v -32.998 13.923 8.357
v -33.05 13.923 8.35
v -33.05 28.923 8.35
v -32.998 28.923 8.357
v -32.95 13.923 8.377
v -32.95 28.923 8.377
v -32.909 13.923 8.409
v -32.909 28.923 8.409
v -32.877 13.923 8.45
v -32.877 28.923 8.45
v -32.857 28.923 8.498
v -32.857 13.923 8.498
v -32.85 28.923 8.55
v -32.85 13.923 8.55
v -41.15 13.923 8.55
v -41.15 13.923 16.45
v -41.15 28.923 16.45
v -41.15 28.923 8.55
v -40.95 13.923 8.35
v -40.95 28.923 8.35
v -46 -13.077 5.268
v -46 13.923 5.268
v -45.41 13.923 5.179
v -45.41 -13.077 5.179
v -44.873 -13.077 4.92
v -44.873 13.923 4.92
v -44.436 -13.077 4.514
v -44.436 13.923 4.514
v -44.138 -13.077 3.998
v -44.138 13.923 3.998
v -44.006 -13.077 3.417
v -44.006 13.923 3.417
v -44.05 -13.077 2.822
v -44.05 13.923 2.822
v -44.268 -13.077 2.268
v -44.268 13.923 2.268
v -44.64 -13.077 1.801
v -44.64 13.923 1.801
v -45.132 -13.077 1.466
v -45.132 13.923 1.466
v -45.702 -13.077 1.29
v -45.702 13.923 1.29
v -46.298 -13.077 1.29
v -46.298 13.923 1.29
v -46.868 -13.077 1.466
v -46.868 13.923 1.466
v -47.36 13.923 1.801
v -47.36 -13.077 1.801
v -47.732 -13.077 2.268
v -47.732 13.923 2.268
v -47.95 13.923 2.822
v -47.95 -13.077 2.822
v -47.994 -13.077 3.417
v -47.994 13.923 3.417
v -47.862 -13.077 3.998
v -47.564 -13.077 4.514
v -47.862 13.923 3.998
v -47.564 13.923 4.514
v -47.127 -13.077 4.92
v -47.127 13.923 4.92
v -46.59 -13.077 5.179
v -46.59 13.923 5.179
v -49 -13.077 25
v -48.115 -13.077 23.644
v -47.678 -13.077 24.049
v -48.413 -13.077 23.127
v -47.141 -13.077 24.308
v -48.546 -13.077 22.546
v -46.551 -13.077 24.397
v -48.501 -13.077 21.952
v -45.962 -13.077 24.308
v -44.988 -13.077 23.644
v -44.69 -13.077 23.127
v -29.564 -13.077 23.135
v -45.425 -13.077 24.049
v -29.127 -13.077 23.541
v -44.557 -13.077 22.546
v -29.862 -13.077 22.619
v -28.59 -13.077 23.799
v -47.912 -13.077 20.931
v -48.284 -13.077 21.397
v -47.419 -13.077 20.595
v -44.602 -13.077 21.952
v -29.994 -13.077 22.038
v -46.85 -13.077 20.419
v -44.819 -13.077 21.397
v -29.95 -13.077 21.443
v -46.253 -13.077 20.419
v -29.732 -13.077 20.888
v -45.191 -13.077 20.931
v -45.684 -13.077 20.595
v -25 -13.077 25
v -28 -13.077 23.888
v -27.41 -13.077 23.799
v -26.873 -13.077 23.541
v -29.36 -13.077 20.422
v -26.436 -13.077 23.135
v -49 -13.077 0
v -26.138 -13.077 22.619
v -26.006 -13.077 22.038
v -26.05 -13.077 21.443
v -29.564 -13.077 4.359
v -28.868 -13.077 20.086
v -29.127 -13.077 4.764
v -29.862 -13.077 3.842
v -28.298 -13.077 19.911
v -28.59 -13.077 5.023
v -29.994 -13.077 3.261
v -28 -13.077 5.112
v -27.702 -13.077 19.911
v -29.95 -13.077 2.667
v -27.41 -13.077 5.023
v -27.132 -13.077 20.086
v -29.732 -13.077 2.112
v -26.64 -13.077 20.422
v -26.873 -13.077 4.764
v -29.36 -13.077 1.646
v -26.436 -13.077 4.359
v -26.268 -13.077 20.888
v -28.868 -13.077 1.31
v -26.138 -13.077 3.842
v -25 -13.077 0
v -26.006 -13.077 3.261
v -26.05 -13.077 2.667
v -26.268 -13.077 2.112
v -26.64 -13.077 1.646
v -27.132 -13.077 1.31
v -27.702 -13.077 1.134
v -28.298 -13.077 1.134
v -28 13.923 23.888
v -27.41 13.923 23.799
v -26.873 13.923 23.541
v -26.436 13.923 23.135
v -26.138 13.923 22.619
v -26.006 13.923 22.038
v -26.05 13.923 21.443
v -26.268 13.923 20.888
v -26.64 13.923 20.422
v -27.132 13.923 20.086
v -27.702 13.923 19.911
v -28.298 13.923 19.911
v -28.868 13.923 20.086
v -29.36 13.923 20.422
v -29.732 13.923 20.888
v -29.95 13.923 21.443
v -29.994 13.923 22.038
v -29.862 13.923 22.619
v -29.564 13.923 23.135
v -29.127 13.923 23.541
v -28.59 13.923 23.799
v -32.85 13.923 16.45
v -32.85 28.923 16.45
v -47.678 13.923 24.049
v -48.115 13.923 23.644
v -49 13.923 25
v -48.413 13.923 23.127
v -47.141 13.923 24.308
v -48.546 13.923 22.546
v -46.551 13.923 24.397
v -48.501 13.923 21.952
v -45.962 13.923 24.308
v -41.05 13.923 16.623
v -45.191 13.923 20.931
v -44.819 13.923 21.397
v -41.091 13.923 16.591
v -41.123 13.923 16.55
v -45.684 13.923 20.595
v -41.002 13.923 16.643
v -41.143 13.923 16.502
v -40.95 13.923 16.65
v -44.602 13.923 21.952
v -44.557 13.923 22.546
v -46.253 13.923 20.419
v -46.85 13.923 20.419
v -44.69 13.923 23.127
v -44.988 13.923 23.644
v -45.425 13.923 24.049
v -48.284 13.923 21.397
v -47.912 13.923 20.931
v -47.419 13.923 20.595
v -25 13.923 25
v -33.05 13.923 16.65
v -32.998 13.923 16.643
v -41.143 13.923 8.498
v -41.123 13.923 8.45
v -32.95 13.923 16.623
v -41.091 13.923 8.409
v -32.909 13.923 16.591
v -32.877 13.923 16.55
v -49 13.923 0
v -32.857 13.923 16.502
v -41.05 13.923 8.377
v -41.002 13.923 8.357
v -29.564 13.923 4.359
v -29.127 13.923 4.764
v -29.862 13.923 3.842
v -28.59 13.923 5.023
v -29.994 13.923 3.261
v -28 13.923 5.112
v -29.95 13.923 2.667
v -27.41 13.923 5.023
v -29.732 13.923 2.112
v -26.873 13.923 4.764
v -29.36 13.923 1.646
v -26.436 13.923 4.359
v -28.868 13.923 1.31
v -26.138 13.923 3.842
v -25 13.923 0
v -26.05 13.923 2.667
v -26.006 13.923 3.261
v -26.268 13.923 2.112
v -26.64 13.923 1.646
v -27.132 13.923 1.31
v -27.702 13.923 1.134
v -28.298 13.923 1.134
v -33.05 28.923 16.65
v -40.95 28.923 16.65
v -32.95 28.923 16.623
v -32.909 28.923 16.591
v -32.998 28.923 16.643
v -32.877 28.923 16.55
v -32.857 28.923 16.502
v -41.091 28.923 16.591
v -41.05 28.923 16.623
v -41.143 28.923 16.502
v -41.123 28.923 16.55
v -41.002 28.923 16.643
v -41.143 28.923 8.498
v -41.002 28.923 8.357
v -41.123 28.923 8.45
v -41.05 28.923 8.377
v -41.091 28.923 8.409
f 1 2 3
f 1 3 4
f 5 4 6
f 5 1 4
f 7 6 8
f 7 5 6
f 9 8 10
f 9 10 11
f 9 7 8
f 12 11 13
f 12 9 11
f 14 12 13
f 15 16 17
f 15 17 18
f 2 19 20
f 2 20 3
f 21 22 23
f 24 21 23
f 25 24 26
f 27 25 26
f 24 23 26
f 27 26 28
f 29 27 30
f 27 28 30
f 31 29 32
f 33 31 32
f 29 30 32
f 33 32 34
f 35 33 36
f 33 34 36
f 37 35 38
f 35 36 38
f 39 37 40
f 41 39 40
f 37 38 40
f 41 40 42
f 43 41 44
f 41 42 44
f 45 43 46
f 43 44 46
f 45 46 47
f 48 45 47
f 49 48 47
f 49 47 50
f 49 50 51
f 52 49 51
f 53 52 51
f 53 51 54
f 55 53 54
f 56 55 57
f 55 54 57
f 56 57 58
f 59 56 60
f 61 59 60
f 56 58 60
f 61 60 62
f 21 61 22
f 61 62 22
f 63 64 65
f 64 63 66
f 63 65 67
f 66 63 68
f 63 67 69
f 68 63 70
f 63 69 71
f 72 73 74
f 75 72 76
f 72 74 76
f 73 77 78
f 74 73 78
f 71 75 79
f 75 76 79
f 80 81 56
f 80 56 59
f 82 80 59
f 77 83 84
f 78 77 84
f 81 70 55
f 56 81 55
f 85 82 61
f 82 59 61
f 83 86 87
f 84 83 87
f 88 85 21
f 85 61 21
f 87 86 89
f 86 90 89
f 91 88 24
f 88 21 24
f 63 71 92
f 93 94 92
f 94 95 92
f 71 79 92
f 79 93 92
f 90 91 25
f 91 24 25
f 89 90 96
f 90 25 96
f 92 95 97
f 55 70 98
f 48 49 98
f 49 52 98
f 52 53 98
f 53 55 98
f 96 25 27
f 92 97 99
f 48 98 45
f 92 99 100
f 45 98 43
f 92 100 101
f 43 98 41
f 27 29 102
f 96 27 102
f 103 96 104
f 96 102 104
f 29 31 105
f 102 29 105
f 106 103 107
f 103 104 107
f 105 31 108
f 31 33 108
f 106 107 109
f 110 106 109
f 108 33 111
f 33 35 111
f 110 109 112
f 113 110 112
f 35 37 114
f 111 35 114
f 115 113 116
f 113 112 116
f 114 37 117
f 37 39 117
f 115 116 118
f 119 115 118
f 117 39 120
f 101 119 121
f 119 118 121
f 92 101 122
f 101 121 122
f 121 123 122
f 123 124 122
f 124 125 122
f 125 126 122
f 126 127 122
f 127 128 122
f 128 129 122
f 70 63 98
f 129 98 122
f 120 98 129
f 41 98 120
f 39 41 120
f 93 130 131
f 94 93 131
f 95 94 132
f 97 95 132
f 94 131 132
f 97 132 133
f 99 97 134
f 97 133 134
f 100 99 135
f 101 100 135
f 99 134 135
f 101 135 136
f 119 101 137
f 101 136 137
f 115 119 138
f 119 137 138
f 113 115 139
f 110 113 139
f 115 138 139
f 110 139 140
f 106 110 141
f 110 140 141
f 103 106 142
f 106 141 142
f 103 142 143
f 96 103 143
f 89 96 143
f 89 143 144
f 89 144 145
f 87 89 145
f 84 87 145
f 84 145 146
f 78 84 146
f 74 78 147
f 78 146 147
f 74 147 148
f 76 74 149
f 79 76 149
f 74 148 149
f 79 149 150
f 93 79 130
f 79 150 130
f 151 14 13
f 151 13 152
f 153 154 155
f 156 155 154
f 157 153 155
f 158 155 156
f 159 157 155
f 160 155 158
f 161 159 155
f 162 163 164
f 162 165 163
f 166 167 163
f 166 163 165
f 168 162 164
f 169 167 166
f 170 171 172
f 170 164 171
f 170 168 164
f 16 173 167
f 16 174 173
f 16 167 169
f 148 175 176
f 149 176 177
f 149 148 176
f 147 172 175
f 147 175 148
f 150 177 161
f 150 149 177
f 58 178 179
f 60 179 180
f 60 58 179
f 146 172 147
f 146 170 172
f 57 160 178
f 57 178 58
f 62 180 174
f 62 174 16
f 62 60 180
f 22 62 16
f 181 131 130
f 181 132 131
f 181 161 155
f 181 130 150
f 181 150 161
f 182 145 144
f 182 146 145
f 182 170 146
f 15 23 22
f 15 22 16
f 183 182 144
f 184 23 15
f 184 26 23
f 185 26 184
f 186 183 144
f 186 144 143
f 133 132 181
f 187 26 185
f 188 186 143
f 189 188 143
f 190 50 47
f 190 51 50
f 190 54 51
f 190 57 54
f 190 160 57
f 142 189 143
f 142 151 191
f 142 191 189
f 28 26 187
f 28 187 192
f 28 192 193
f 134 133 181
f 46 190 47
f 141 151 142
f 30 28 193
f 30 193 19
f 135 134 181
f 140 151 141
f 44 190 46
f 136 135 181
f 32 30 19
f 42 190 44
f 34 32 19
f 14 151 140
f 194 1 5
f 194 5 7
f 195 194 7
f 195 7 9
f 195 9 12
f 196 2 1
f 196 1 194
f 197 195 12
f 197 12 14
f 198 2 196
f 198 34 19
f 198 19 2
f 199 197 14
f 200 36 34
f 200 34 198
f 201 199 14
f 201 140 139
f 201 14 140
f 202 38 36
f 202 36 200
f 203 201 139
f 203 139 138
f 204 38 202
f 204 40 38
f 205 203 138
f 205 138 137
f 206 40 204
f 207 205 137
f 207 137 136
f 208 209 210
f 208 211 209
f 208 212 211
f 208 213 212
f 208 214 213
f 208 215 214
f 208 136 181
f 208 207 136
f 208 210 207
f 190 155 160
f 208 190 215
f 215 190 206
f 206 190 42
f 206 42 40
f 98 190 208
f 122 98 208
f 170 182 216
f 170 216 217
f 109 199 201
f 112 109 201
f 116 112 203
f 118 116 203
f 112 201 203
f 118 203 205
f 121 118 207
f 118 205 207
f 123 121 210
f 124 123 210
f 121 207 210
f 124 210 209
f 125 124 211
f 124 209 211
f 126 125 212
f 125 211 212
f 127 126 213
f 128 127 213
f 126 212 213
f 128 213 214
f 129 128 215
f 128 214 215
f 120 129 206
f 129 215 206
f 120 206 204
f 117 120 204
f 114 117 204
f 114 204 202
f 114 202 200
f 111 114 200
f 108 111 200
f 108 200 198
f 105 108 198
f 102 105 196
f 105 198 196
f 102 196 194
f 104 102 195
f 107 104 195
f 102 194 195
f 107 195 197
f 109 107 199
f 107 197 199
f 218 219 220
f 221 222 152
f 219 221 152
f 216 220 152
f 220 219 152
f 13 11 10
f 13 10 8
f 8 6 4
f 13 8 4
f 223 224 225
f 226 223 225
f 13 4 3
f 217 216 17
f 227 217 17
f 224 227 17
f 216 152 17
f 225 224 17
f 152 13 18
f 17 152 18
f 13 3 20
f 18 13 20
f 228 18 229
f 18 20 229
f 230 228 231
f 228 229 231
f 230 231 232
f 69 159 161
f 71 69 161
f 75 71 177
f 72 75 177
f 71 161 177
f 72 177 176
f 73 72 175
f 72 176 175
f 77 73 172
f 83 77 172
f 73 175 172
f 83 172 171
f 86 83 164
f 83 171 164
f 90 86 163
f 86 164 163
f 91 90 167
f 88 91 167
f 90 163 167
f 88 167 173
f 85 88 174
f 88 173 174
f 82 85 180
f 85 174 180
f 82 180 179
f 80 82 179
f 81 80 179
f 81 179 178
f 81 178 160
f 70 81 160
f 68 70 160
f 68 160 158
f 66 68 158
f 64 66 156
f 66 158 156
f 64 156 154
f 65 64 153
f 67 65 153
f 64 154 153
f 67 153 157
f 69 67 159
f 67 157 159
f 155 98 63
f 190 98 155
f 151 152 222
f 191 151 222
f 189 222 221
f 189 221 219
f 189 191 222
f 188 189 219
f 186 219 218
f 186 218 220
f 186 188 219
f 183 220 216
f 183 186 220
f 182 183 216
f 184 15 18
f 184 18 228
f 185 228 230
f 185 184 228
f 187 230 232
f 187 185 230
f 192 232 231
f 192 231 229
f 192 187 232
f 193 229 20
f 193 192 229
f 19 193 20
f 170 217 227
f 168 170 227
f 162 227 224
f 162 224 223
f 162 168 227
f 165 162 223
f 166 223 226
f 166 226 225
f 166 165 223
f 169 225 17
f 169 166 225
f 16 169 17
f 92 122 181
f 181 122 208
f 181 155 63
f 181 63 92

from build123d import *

# Parameters (mm, degrees)
CROQUIS1_W              = 24
CROQUIS1_H              = 27
SALIENTE_EXTRUIR1_DEPTH = 25
SALIENTE_EXTRUIR2_DEPTH = 15
CROQUIS5_R              = 2
CORTAR_EXTRUIR1_DEPTH   = 27


with BuildPart() as part:
    # Croquis1 → Saliente-Extruir1 (new body)
    with BuildSketch(Plane.XY):
        with Locations((-37, 0.422764228)):
            Rectangle(CROQUIS1_W, CROQUIS1_H)
    extrude(amount=SALIENTE_EXTRUIR1_DEPTH)

    # Croquis2 → Saliente-Extruir2 (add)
    with BuildSketch(Plane(origin=(0, 13.922764228, 0), x_dir=(1, 0, 0), z_dir=(0, 1, 0))):
        with BuildLine():
            Line((-40.95, -8.35), (-33.05, -8.35))
            ThreePointArc((-33.05, -8.35), (-32.908578644, -8.408578644), (-32.85, -8.55))
            Line((-32.85, -8.55), (-32.85, -16.45))
            ThreePointArc((-32.85, -16.45), (-32.908578644, -16.591421356), (-33.05, -16.65))
            Line((-33.05, -16.65), (-40.95, -16.65))
            ThreePointArc((-40.95, -16.65), (-41.091421356, -16.591421356), (-41.15, -16.45))
            Line((-41.15, -16.45), (-41.15, -8.55))
            ThreePointArc((-41.15, -8.55), (-41.091421356, -8.408578644), (-40.95, -8.35))
        make_face()
    extrude(amount=SALIENTE_EXTRUIR2_DEPTH)

    # Croquis5 → Cortar-Extruir1 (cut)
    with BuildSketch(Plane(origin=(0, 13.922764228, 0), x_dir=(1, 0, 0), z_dir=(0, 1, 0))):
        with Locations(Location((-46.551489219, -22.396688282, 0), (0, 0, 270))):
            Circle(CROQUIS5_R)
        with Locations(Location((-28, -21.888198758, 0), (0, 0, 270))):
            Circle(CROQUIS5_R)
        with Locations(Location((-46, -3.267515924, 0), (0, 0, 270))):
            Circle(CROQUIS5_R)
        with Locations(Location((-28, -3.111801242, 0), (0, 0, 270))):
            Circle(CROQUIS5_R)
    extrude(amount=-CORTAR_EXTRUIR1_DEPTH, mode=Mode.SUBTRACT)


solid = part.part
